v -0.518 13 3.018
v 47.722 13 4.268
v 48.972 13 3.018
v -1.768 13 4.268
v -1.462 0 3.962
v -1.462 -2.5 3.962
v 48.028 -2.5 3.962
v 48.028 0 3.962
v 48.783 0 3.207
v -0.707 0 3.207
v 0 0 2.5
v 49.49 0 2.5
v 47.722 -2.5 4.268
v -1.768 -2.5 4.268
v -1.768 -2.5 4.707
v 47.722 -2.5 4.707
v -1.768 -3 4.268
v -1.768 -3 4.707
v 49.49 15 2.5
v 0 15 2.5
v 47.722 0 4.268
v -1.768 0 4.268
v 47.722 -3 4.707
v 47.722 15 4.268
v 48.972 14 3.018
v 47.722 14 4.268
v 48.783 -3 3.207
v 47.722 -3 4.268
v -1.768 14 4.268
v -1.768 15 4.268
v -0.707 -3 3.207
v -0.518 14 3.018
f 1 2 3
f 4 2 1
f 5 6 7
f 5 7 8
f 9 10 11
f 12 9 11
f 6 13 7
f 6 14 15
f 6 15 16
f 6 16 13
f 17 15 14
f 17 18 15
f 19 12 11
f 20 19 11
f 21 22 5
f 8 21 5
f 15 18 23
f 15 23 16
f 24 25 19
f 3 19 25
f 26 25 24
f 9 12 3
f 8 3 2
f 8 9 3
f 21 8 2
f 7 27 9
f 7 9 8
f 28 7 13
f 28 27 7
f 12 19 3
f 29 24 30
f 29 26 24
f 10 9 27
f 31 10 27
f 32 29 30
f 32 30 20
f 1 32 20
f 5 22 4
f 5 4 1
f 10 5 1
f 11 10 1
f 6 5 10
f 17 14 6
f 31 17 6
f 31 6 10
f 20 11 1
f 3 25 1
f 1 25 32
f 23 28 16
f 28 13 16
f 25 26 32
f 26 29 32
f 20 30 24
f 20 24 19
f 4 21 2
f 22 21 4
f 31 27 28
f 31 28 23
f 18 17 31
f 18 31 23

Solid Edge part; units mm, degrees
sketch "Sketch1" plane through (0, 0, 0) normal (0, -1, 0) x (1, 0, 0)
  line L0 (47.7222, 4.2678) -> (-1.7678, 4.2678)
  line L1 (-1.7678, 4.2678) -> (0, 2.5)
  line L2 (49.49, 2.5) -> (0, 2.5)
  line L3 (49.49, 2.5) -> (47.7222, 4.2678)
extrude "Protrusion1" add sketch "Sketch1" against normal blind 15
sketch "Sketch2" plane through (22.9772, 7.5, 4.2678) normal (0, 0, 1) x (1, 0, 0)
  line L0 (-24.745, 5.5) -> (-24.745, 6.5)
  line L1 (-24.745, 6.5) -> (24.745, 6.5)
  line L2 (24.745, 6.5) -> (24.745, 5.5)
  line L3 (24.745, 5.5) -> (-24.745, 5.5)
extrude "Vyříznutí_1" cut sketch "Sketch2" against normal blind 1.25
sketch "Sketch3" plane through (47.7222, 13.5, 3.6428) normal (-1, 0, 0) x (0, 0, 1)
  line L0 (-0.625, 0.5) -> (0.625, 0.5)
  line L1 (0.625, 0.5) -> (0.625, -0.5)
  line L2 (0.625, -0.5) -> (-0.625, -0.5)
  line L3 (-0.625, -0.5) -> (-0.625, 0.5)
extrude "Vyříznutí_2" cut sketch "Sketch3" against normal blind 7.0597
sketch "Sketch4" plane through (0, 0, 0) normal (-1, 0, 0) x (0, -1, 0)
  line L0 (2.5, 3.9615) -> (0, 3.9615)
  line L1 (0, 3.9615) -> (0, 3.2071)
  line L2 (0, 3.2071) -> (3, 3.2071)
  line L3 (3, 3.2071) -> (3, 4.7071)
  line L4 (3, 4.7071) -> (2.5, 4.7071)
  line L5 (2.5, 4.7071) -> (2.5, 3.9615)
extrude "Vysunutí_2" add sketch "Sketch4" against normal blind 49.49
sketch "Sketch5" plane through (0, 0, 0) normal (-1, 0, 0) x (0, -1, 0)
  line L0 (2.5, 3.9615) -> (0, 3.9615)
  line L1 (0, 3.9615) -> (0, 3.2071)
  line L2 (0, 3.2071) -> (3, 3.2071)
  line L3 (3, 3.2071) -> (3, 4.7071)
  line L4 (3, 4.7071) -> (2.5, 4.7071)
  line L5 (2.5, 4.7071) -> (2.5, 3.9615)
extrude "Protrusion2" add sketch "Sketch5" along normal up to vertex (1.7678 mm away)
sketch "Sketch6" plane through (-0.8839, 7.5, 3.3839) normal (-0.7071, 0, -0.7071) x (0, -1, 0)
  line L0 (10.5, 2.29) -> (10, 2.29)
  line L1 (10, 2.29) -> (10, 0.5)
  line L2 (10, 0.5) -> (7.5, 0.5)
  line L3 (7.5, -0.25) -> (7.5, 0.5)
  line L4 (7.5, -0.25) -> (10.5, -0.25)
  line L5 (10.5, -0.25) -> (10.5, 2.29)
extrude "Vyříznutí_3" cut sketch "Sketch6" along normal blind 2.1617
sketch "Sketch7" plane through (23.8611, 15, 3.3839) normal (0, 1, 0) x (1, 0, 0)
  line L0 (-25.7842, 0.8839) -> (-25.6289, -0.8839)
  line L1 (-25.6289, -0.8839) -> (-23.8611, 0.8839)
  line L2 (-23.8611, 0.8839) -> (-25.7842, 0.8839)
  line L3 (23.8611, -1.3232) -> (25.6289, -1.3232)
  line L4 (25.6289, -1.3232) -> (25.6289, 0.8839)
  line L5 (25.6289, 0.8839) -> (23.8611, -0.8839)
  line L6 (23.8611, -0.8839) -> (23.8611, -1.3232)
extrude "Vyříznutí_5" cut sketch "Sketch7" against normal blind 20.1859
